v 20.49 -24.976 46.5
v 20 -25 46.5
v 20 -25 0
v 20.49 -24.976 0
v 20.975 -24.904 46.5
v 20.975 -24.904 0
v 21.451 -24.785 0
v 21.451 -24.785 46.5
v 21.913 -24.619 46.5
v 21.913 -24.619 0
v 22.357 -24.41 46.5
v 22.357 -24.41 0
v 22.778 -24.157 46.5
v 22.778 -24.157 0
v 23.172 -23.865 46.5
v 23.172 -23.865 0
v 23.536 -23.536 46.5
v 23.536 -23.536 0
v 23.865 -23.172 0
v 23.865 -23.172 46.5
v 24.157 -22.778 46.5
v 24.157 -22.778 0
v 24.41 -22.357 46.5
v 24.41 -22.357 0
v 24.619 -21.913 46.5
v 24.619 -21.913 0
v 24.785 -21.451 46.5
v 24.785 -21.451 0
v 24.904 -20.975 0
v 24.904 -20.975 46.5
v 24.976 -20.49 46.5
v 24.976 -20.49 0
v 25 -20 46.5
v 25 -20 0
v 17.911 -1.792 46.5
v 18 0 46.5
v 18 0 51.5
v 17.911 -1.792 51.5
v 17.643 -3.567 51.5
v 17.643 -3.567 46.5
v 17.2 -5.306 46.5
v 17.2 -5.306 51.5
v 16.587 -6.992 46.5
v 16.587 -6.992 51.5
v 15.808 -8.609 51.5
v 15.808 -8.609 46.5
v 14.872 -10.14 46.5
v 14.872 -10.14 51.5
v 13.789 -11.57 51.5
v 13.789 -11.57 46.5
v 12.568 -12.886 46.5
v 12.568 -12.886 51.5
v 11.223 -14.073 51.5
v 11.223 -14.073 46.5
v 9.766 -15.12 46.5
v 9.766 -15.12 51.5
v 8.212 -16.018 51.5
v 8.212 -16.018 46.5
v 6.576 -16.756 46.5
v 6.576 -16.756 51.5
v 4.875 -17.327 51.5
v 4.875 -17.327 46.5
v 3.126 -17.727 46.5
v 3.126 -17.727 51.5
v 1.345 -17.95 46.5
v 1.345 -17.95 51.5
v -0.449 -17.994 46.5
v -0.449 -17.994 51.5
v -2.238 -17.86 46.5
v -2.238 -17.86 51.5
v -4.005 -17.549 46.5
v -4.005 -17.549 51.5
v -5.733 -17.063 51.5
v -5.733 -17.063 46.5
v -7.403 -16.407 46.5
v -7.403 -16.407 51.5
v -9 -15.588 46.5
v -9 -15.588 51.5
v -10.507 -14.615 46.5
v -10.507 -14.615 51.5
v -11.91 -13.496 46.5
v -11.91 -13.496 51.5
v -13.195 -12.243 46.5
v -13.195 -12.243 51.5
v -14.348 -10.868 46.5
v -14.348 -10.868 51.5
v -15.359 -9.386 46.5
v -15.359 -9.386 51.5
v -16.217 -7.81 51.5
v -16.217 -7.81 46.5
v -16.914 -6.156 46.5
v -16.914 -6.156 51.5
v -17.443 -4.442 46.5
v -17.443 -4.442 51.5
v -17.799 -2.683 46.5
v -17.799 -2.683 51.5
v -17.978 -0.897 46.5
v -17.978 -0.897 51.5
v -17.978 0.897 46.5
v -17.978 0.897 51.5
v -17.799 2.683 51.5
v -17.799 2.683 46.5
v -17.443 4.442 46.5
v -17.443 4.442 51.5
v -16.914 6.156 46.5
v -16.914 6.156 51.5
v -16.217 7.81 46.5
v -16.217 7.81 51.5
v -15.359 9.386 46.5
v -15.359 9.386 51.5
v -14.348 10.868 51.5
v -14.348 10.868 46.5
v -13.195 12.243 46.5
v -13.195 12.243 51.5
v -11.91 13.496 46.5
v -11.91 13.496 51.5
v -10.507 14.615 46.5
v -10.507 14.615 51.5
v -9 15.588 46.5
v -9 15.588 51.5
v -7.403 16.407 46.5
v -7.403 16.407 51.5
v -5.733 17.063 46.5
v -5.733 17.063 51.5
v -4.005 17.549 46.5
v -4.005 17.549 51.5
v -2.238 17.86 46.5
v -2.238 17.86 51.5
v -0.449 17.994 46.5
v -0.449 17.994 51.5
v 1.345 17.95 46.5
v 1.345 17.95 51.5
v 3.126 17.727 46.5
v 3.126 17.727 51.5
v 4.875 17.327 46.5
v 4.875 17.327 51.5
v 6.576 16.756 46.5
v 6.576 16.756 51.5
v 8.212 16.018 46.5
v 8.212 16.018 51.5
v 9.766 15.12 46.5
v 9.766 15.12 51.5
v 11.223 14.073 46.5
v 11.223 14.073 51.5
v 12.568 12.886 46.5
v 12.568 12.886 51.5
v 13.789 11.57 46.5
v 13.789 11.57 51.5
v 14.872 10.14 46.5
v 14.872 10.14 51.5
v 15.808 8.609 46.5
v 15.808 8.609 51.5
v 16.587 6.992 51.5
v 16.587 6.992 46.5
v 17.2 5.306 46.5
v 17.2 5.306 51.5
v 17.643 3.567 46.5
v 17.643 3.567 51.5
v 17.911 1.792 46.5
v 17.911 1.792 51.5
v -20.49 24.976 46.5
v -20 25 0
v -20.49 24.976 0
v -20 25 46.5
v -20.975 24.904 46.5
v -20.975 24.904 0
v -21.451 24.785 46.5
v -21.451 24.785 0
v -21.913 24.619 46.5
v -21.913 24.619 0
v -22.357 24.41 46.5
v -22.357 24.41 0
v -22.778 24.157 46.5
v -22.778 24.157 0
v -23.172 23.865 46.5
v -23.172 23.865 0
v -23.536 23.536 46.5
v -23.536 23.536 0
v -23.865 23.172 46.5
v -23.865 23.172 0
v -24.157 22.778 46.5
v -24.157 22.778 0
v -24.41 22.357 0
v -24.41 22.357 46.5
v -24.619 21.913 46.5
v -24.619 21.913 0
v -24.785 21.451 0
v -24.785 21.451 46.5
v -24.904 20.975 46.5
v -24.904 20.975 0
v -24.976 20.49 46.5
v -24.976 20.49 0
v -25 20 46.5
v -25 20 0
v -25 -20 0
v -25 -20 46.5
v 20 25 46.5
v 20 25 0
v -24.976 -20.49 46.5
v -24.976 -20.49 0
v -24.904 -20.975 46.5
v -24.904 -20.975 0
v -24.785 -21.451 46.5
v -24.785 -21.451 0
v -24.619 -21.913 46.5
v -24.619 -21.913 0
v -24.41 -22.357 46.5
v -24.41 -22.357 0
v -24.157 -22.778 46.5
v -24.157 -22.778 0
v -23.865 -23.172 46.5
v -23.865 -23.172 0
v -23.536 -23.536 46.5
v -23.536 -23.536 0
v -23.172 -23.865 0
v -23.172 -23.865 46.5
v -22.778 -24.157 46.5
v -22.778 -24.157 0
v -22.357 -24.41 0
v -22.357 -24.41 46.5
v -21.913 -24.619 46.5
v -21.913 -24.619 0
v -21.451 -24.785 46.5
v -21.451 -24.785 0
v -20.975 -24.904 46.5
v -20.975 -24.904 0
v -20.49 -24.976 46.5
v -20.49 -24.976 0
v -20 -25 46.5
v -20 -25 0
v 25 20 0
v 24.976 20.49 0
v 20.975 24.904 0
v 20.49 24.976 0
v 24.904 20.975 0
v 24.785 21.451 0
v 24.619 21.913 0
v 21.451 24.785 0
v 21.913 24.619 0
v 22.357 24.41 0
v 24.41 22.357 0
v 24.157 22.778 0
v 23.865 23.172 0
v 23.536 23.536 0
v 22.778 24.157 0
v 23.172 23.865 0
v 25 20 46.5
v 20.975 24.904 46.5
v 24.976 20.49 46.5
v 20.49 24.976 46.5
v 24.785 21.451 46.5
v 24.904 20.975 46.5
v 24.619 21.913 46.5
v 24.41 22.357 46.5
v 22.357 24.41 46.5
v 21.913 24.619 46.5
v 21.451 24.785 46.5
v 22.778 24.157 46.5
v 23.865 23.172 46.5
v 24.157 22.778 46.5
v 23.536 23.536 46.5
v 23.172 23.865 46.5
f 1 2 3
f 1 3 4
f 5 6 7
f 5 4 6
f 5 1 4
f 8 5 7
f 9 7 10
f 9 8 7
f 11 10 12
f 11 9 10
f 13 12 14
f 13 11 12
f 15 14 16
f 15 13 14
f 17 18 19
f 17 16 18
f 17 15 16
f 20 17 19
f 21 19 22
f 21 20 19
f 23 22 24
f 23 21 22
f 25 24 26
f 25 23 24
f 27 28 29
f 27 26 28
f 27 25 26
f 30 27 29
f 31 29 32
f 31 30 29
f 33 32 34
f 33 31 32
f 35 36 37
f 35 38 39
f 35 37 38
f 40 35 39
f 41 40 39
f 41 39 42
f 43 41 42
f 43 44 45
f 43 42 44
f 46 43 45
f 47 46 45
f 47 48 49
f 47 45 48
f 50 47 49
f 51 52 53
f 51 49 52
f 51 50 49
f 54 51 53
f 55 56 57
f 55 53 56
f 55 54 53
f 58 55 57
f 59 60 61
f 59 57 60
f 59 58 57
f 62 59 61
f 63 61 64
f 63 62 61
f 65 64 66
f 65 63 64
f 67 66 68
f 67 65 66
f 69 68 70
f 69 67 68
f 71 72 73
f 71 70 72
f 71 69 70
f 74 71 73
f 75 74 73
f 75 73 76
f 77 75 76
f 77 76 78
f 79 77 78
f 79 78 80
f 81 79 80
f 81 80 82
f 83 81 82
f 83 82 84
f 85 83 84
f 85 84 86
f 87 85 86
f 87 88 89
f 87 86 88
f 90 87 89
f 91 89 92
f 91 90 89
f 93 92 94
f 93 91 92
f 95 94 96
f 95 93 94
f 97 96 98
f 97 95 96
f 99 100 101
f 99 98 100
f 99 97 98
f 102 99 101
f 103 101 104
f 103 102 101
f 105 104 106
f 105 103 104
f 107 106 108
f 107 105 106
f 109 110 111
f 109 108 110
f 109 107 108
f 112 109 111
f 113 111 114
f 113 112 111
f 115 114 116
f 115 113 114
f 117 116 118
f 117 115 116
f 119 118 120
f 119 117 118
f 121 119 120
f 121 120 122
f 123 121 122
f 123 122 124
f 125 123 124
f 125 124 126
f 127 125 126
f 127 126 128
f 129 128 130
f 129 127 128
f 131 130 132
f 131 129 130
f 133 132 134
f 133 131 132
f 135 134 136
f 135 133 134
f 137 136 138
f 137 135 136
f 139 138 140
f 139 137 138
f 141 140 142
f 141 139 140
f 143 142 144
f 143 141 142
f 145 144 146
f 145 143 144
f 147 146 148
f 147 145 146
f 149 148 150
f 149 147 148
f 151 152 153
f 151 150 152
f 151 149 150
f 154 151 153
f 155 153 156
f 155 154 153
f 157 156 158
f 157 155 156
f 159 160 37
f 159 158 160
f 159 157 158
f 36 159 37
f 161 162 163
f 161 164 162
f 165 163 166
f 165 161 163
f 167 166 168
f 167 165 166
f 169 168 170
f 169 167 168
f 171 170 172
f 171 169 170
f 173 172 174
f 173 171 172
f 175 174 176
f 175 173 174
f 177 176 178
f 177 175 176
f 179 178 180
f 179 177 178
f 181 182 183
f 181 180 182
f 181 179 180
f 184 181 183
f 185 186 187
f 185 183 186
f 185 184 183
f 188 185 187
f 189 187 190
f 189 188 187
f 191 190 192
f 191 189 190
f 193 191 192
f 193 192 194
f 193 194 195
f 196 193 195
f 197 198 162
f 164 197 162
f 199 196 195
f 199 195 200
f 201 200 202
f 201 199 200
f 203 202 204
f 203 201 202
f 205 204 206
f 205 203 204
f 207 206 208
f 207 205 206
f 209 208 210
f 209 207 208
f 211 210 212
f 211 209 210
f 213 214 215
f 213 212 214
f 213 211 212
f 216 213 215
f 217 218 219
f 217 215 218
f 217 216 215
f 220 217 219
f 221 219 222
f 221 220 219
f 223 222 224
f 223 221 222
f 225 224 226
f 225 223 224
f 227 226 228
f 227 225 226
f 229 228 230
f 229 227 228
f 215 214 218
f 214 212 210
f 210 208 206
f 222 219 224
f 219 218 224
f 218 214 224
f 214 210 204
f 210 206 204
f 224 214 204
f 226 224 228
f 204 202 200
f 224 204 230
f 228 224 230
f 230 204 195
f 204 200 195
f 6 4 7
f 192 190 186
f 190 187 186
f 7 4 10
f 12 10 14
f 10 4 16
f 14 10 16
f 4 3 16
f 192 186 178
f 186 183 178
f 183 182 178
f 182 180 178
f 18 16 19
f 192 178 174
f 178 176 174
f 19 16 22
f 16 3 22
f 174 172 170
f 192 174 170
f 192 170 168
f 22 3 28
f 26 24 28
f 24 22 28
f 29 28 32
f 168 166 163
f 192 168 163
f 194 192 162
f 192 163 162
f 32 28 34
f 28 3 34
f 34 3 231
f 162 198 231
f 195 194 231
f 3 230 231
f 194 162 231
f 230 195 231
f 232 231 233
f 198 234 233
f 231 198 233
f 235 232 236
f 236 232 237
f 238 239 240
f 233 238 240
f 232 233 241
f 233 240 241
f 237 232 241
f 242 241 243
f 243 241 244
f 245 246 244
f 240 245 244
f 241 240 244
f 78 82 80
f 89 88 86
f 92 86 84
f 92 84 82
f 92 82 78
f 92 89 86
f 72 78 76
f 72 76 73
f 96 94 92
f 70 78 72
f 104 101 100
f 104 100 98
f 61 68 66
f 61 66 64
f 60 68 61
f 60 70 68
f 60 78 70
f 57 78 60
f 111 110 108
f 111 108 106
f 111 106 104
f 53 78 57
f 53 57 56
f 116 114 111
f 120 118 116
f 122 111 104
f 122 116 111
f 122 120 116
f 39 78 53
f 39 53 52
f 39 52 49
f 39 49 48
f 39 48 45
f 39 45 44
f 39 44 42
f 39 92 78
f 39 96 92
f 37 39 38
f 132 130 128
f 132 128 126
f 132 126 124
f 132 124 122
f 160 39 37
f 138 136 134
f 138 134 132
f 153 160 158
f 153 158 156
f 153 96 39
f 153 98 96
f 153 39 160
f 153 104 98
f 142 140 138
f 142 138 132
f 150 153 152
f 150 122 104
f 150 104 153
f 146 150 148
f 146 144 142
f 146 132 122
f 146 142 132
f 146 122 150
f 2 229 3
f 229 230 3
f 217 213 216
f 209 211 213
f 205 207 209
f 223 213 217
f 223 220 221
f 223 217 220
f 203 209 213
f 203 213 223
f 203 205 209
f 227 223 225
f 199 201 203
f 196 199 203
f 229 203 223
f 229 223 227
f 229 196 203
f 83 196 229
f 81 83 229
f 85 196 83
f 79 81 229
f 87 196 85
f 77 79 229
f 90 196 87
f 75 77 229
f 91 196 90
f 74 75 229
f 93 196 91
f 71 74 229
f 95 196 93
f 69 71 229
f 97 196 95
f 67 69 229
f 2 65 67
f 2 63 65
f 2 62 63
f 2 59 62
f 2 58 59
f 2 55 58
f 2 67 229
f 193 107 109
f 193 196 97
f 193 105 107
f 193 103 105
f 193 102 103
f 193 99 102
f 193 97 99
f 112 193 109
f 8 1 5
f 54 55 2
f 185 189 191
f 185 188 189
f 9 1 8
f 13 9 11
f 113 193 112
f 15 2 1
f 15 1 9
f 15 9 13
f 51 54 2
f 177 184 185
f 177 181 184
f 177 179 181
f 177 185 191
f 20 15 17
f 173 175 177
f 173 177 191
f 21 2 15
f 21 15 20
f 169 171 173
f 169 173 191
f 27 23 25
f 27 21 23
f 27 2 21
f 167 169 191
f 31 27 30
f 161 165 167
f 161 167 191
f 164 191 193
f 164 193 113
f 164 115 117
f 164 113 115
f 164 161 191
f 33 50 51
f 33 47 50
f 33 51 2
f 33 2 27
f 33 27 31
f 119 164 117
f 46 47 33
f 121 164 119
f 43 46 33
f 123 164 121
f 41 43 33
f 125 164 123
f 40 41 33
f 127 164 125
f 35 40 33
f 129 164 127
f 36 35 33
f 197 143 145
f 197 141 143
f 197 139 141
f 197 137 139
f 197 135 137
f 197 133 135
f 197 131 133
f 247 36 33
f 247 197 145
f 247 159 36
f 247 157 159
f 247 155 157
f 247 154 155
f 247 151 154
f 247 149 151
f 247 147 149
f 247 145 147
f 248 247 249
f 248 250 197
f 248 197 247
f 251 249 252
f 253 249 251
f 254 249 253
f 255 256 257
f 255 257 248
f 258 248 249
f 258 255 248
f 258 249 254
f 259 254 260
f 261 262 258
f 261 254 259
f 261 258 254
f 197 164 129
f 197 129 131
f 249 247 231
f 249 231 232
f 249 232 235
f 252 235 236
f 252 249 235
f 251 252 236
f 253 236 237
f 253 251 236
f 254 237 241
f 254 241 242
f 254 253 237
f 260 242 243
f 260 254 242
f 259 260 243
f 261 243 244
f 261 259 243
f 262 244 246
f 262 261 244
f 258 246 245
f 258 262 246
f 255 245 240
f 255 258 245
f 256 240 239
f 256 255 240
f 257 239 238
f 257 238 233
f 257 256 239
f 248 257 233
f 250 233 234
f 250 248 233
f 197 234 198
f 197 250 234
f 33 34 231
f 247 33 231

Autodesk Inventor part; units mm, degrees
ref_plane "YZ Plane" through (0, 0, 0) normal (1, 0, 0) x (0, 1, 0)
ref_plane "XZ Plane" through (0, 0, 0) normal (0, 1, 0) x (-1, 0, 0)
ref_plane "XY Plane" through (0, 0, 0) normal (0, 0, 1) x (1, 0, 0)
sketch "Sketch1" plane through (0, 0, 0) normal (0, 0, 1) x (1, 0, 0)
  line L0 (25, 25) -> (-25, 25)
  line L1 (-25, 25) -> (-25, -25)
  line L2 (-25, -25) -> (25, -25)
  line L3 (25, -25) -> (25, 25)
  line L4 (25, 25) -> (-25, -25) construction
  line L5 (-25, 25) -> (25, -25) construction
  point P0 (0, 0)
  dimension "d0" = 50
  dimension "d1" = 50
extrude "Extrusion1" add sketch "Sketch1" along normal blind 46.5
fillet "Fillet1" radius 5 4 edges at (-25, -25, 23.25) (25, -25, 23.25) (25, 25, 23.25) (-25, 25, 23.25)
sketch "Sketch2" plane through (0, 0, 46.5) normal (0, 0, 1) x (1, 0, 0)
  circle A0 centre (0, 0) radius 18
  dimension "d5" = 36
extrude "Extrusion2" add sketch "Sketch2" along normal blind 5
properties part number "Camera" material "Steel, Carbon"
